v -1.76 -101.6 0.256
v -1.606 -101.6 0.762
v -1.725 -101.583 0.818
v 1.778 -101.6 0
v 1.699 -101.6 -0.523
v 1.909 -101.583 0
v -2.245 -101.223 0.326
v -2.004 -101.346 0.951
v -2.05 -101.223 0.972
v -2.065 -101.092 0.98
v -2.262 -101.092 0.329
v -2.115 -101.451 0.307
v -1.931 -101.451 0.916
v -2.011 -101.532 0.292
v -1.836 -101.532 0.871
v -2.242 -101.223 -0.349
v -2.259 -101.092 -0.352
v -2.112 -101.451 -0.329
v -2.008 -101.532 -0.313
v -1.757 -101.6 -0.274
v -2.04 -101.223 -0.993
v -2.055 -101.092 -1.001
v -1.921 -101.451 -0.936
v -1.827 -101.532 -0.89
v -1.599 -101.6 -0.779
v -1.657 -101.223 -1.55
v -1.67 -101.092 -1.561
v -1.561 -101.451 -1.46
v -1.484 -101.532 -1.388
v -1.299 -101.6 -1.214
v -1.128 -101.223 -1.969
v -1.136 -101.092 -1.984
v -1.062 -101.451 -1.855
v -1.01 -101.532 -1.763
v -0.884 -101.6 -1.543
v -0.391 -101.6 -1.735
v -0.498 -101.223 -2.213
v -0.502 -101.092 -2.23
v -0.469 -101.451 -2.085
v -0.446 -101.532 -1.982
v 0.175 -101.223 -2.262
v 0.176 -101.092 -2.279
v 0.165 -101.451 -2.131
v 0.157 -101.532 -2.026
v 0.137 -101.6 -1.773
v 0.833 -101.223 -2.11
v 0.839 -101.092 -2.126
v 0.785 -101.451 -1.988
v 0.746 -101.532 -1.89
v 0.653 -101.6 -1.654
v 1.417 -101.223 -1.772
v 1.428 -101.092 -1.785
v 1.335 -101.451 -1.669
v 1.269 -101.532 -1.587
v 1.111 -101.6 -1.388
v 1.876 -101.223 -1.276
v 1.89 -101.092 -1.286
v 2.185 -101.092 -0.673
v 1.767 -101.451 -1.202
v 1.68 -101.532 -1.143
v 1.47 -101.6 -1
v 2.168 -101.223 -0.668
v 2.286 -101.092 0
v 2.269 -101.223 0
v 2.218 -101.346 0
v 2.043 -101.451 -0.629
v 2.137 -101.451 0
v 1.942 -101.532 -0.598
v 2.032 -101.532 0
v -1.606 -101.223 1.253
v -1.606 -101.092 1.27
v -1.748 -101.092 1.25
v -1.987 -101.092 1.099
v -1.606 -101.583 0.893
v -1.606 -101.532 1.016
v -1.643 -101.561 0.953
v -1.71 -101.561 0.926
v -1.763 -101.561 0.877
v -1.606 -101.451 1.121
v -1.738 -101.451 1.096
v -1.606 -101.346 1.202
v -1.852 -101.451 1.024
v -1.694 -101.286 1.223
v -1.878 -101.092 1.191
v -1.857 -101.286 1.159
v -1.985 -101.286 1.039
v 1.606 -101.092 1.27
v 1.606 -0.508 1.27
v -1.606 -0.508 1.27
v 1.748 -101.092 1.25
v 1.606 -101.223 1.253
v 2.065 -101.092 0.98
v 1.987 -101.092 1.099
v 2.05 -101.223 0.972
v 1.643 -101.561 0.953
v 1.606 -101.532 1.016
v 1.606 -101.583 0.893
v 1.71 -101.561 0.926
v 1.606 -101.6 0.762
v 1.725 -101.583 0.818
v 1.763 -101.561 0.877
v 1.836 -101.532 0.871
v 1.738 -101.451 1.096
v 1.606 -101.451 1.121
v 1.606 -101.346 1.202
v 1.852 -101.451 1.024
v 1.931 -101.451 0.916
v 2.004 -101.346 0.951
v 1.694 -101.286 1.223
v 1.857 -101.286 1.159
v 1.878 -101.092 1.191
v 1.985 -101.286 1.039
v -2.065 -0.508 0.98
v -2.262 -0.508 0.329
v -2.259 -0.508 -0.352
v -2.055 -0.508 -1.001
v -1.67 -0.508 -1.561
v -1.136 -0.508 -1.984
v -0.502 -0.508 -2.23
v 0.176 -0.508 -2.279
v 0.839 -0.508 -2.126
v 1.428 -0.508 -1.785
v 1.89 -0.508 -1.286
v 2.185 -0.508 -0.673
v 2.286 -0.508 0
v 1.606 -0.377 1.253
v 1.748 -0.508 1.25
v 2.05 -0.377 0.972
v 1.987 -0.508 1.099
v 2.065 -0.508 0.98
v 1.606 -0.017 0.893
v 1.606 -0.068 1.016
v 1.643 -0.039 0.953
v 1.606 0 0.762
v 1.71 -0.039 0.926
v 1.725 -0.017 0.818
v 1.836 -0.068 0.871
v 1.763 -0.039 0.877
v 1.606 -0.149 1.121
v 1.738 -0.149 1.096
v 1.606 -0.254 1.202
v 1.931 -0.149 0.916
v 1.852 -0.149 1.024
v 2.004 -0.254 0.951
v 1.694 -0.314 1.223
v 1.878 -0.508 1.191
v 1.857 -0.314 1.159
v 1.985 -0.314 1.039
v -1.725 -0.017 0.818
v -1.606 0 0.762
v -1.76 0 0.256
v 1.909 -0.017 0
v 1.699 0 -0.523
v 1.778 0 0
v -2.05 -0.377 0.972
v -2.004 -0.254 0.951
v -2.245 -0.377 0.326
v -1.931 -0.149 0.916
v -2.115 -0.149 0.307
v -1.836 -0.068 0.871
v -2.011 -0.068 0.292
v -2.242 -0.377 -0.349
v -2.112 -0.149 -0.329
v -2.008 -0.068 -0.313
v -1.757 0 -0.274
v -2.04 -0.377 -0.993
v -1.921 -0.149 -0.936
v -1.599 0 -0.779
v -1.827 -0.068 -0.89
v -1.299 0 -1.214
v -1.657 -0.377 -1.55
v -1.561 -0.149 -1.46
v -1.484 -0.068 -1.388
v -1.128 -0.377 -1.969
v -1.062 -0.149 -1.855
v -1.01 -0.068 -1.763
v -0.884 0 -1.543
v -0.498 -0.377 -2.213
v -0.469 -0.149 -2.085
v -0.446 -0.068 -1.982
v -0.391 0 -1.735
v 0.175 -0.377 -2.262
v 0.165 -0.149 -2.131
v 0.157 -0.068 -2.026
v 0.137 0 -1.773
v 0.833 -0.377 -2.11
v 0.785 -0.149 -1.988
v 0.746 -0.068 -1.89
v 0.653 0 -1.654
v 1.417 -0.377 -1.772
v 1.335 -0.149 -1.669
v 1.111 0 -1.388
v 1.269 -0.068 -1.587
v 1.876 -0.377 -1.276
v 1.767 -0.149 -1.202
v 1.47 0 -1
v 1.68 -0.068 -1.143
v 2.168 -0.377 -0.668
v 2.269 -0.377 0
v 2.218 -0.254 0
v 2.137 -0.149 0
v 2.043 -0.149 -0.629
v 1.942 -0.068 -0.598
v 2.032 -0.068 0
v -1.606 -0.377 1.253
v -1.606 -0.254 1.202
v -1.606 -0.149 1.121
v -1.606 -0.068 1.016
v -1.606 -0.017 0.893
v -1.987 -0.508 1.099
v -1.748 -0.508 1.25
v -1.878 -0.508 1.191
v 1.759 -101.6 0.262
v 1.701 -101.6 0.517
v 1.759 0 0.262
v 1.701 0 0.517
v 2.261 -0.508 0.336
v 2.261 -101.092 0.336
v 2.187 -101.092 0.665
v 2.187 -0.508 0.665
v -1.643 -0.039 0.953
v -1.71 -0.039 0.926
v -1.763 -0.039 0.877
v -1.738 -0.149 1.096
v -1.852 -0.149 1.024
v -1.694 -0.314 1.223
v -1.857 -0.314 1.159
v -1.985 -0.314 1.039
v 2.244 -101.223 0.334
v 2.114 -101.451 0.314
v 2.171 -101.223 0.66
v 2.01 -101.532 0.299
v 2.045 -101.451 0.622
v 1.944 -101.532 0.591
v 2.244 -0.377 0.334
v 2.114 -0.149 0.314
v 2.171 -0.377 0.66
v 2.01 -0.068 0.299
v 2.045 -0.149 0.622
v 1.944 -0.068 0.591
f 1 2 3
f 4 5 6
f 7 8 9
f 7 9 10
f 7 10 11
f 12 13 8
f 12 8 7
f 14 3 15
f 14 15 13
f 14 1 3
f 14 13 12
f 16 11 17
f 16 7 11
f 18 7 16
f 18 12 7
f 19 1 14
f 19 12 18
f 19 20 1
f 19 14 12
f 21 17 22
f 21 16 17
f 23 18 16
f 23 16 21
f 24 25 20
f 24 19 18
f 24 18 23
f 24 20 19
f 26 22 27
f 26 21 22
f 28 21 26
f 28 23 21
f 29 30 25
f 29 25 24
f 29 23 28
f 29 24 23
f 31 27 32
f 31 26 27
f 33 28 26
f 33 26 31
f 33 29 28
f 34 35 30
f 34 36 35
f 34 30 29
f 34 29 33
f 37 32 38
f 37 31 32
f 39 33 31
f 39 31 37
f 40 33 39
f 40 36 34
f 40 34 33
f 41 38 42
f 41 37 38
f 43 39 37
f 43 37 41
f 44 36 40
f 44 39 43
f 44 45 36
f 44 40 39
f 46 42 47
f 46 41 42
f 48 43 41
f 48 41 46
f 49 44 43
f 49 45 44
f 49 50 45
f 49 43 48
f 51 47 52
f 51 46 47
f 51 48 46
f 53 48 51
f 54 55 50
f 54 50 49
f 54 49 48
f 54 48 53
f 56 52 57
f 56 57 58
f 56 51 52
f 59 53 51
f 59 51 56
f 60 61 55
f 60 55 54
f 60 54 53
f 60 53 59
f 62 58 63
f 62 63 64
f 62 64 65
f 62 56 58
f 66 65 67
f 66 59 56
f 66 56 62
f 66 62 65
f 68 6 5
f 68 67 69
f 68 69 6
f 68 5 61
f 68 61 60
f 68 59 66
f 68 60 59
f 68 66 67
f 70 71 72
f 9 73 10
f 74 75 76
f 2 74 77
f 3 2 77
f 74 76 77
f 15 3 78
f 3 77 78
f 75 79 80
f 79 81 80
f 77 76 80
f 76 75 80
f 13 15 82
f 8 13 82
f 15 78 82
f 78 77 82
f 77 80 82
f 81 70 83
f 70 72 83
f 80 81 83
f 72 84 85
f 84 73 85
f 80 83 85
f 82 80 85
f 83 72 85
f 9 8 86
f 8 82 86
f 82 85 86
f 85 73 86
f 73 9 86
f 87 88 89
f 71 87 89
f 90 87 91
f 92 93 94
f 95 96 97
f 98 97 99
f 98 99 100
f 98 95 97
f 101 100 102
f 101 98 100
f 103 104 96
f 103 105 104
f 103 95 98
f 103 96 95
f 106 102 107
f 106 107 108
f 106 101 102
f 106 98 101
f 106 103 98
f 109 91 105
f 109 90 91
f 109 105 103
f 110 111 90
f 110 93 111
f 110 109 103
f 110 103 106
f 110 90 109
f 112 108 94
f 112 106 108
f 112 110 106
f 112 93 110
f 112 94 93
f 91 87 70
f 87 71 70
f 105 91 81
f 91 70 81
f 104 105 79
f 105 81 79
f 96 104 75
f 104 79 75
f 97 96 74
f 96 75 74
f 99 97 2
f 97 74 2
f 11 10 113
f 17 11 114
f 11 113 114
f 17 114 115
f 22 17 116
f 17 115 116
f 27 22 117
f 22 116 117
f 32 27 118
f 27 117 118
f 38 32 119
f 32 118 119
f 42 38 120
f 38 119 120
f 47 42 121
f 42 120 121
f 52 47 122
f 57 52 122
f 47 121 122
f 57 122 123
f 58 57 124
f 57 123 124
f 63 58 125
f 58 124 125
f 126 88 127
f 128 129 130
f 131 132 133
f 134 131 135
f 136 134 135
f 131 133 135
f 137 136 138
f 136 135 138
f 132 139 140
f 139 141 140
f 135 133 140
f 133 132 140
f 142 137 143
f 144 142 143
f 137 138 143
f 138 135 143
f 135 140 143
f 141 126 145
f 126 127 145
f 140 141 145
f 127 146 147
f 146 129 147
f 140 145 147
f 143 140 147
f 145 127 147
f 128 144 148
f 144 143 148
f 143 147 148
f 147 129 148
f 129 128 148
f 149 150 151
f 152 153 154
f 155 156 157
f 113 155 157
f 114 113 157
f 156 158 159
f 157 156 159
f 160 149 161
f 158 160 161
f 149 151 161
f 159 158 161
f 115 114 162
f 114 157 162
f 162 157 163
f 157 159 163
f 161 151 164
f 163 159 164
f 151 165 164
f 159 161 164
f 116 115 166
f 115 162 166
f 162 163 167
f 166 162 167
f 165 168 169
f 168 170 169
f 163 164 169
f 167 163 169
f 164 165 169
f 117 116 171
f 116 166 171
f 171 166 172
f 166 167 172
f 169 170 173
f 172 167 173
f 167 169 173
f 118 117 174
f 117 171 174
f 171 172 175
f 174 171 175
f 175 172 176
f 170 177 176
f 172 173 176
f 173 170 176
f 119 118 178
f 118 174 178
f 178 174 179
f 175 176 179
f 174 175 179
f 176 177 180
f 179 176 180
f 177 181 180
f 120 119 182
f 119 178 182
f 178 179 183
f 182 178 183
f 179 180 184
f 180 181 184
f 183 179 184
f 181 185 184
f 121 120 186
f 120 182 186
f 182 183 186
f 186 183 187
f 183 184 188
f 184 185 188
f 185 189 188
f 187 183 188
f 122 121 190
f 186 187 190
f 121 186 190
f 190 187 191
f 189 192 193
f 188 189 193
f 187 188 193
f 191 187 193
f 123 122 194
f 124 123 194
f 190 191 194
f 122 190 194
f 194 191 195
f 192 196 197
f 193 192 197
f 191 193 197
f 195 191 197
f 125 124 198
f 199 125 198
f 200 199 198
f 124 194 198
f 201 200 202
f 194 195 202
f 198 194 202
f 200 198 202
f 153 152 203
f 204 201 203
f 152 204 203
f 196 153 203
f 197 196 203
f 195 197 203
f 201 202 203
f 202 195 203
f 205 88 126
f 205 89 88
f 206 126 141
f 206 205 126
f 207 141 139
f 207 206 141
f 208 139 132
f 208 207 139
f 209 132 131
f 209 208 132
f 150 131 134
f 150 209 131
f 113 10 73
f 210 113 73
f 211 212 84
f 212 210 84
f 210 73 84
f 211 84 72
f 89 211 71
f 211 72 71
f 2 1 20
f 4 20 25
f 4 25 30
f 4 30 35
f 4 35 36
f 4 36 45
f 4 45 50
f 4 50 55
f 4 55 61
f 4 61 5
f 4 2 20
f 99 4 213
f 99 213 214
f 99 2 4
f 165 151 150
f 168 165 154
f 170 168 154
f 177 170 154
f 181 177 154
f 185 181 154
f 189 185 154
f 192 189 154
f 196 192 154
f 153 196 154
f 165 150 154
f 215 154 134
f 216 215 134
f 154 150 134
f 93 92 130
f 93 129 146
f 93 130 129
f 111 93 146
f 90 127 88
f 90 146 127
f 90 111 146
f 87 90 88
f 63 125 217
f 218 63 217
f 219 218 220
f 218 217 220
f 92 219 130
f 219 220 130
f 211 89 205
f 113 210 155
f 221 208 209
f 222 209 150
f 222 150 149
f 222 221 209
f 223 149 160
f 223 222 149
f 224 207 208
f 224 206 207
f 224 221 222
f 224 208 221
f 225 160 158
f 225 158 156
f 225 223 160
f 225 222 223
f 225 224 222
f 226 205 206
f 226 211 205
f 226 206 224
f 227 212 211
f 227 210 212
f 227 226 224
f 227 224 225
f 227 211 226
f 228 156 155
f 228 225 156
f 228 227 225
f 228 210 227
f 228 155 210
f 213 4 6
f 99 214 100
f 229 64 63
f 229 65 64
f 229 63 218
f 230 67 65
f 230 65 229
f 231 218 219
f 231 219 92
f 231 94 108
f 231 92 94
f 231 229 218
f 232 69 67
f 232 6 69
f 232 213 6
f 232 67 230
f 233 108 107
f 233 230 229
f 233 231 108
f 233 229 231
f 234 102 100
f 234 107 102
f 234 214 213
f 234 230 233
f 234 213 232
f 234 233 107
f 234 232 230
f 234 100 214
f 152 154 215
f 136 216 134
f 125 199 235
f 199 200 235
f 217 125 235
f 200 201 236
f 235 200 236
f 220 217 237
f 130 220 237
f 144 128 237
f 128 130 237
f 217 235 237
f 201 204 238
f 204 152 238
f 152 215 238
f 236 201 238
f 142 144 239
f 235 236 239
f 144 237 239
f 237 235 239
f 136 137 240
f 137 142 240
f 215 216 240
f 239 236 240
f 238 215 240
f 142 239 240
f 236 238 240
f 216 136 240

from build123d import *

# Parameters (mm, degrees)
F1_DEPTH = 101.6
F2_R     = 0.508


with BuildPart() as f1:
    # F0 (on Front) → F1 (new body)
    with BuildSketch(Plane.XZ):
        with BuildLine():
            ThreePointArc((-1.9007619525, 1.27), (-0.6635714644, -2.1875714644), (2.286, 0))
            ThreePointArc((2.286, 0), (2.1875714644, 0.6635714644), (1.9007619525, 1.27))
            Line((1.9007619525, 1.27), (-1.9007619525, 1.27))
        make_face()
    extrude(amount=F1_DEPTH)

    # F2
    f2_edges = [f1.edges().sort_by_distance(p)[0] for p in [
        (-1.900762, -50.8, 1.27),
        (0, -101.6, 1.27),
        (-0.663571, -101.6, -2.187571),
        (0, 0, 1.27),
        (-0.663571, 0, -2.187571),
        (1.900762, -50.8, 1.27),
    ]]
    fillet(f2_edges, radius=F2_R)


solid = f1.part
